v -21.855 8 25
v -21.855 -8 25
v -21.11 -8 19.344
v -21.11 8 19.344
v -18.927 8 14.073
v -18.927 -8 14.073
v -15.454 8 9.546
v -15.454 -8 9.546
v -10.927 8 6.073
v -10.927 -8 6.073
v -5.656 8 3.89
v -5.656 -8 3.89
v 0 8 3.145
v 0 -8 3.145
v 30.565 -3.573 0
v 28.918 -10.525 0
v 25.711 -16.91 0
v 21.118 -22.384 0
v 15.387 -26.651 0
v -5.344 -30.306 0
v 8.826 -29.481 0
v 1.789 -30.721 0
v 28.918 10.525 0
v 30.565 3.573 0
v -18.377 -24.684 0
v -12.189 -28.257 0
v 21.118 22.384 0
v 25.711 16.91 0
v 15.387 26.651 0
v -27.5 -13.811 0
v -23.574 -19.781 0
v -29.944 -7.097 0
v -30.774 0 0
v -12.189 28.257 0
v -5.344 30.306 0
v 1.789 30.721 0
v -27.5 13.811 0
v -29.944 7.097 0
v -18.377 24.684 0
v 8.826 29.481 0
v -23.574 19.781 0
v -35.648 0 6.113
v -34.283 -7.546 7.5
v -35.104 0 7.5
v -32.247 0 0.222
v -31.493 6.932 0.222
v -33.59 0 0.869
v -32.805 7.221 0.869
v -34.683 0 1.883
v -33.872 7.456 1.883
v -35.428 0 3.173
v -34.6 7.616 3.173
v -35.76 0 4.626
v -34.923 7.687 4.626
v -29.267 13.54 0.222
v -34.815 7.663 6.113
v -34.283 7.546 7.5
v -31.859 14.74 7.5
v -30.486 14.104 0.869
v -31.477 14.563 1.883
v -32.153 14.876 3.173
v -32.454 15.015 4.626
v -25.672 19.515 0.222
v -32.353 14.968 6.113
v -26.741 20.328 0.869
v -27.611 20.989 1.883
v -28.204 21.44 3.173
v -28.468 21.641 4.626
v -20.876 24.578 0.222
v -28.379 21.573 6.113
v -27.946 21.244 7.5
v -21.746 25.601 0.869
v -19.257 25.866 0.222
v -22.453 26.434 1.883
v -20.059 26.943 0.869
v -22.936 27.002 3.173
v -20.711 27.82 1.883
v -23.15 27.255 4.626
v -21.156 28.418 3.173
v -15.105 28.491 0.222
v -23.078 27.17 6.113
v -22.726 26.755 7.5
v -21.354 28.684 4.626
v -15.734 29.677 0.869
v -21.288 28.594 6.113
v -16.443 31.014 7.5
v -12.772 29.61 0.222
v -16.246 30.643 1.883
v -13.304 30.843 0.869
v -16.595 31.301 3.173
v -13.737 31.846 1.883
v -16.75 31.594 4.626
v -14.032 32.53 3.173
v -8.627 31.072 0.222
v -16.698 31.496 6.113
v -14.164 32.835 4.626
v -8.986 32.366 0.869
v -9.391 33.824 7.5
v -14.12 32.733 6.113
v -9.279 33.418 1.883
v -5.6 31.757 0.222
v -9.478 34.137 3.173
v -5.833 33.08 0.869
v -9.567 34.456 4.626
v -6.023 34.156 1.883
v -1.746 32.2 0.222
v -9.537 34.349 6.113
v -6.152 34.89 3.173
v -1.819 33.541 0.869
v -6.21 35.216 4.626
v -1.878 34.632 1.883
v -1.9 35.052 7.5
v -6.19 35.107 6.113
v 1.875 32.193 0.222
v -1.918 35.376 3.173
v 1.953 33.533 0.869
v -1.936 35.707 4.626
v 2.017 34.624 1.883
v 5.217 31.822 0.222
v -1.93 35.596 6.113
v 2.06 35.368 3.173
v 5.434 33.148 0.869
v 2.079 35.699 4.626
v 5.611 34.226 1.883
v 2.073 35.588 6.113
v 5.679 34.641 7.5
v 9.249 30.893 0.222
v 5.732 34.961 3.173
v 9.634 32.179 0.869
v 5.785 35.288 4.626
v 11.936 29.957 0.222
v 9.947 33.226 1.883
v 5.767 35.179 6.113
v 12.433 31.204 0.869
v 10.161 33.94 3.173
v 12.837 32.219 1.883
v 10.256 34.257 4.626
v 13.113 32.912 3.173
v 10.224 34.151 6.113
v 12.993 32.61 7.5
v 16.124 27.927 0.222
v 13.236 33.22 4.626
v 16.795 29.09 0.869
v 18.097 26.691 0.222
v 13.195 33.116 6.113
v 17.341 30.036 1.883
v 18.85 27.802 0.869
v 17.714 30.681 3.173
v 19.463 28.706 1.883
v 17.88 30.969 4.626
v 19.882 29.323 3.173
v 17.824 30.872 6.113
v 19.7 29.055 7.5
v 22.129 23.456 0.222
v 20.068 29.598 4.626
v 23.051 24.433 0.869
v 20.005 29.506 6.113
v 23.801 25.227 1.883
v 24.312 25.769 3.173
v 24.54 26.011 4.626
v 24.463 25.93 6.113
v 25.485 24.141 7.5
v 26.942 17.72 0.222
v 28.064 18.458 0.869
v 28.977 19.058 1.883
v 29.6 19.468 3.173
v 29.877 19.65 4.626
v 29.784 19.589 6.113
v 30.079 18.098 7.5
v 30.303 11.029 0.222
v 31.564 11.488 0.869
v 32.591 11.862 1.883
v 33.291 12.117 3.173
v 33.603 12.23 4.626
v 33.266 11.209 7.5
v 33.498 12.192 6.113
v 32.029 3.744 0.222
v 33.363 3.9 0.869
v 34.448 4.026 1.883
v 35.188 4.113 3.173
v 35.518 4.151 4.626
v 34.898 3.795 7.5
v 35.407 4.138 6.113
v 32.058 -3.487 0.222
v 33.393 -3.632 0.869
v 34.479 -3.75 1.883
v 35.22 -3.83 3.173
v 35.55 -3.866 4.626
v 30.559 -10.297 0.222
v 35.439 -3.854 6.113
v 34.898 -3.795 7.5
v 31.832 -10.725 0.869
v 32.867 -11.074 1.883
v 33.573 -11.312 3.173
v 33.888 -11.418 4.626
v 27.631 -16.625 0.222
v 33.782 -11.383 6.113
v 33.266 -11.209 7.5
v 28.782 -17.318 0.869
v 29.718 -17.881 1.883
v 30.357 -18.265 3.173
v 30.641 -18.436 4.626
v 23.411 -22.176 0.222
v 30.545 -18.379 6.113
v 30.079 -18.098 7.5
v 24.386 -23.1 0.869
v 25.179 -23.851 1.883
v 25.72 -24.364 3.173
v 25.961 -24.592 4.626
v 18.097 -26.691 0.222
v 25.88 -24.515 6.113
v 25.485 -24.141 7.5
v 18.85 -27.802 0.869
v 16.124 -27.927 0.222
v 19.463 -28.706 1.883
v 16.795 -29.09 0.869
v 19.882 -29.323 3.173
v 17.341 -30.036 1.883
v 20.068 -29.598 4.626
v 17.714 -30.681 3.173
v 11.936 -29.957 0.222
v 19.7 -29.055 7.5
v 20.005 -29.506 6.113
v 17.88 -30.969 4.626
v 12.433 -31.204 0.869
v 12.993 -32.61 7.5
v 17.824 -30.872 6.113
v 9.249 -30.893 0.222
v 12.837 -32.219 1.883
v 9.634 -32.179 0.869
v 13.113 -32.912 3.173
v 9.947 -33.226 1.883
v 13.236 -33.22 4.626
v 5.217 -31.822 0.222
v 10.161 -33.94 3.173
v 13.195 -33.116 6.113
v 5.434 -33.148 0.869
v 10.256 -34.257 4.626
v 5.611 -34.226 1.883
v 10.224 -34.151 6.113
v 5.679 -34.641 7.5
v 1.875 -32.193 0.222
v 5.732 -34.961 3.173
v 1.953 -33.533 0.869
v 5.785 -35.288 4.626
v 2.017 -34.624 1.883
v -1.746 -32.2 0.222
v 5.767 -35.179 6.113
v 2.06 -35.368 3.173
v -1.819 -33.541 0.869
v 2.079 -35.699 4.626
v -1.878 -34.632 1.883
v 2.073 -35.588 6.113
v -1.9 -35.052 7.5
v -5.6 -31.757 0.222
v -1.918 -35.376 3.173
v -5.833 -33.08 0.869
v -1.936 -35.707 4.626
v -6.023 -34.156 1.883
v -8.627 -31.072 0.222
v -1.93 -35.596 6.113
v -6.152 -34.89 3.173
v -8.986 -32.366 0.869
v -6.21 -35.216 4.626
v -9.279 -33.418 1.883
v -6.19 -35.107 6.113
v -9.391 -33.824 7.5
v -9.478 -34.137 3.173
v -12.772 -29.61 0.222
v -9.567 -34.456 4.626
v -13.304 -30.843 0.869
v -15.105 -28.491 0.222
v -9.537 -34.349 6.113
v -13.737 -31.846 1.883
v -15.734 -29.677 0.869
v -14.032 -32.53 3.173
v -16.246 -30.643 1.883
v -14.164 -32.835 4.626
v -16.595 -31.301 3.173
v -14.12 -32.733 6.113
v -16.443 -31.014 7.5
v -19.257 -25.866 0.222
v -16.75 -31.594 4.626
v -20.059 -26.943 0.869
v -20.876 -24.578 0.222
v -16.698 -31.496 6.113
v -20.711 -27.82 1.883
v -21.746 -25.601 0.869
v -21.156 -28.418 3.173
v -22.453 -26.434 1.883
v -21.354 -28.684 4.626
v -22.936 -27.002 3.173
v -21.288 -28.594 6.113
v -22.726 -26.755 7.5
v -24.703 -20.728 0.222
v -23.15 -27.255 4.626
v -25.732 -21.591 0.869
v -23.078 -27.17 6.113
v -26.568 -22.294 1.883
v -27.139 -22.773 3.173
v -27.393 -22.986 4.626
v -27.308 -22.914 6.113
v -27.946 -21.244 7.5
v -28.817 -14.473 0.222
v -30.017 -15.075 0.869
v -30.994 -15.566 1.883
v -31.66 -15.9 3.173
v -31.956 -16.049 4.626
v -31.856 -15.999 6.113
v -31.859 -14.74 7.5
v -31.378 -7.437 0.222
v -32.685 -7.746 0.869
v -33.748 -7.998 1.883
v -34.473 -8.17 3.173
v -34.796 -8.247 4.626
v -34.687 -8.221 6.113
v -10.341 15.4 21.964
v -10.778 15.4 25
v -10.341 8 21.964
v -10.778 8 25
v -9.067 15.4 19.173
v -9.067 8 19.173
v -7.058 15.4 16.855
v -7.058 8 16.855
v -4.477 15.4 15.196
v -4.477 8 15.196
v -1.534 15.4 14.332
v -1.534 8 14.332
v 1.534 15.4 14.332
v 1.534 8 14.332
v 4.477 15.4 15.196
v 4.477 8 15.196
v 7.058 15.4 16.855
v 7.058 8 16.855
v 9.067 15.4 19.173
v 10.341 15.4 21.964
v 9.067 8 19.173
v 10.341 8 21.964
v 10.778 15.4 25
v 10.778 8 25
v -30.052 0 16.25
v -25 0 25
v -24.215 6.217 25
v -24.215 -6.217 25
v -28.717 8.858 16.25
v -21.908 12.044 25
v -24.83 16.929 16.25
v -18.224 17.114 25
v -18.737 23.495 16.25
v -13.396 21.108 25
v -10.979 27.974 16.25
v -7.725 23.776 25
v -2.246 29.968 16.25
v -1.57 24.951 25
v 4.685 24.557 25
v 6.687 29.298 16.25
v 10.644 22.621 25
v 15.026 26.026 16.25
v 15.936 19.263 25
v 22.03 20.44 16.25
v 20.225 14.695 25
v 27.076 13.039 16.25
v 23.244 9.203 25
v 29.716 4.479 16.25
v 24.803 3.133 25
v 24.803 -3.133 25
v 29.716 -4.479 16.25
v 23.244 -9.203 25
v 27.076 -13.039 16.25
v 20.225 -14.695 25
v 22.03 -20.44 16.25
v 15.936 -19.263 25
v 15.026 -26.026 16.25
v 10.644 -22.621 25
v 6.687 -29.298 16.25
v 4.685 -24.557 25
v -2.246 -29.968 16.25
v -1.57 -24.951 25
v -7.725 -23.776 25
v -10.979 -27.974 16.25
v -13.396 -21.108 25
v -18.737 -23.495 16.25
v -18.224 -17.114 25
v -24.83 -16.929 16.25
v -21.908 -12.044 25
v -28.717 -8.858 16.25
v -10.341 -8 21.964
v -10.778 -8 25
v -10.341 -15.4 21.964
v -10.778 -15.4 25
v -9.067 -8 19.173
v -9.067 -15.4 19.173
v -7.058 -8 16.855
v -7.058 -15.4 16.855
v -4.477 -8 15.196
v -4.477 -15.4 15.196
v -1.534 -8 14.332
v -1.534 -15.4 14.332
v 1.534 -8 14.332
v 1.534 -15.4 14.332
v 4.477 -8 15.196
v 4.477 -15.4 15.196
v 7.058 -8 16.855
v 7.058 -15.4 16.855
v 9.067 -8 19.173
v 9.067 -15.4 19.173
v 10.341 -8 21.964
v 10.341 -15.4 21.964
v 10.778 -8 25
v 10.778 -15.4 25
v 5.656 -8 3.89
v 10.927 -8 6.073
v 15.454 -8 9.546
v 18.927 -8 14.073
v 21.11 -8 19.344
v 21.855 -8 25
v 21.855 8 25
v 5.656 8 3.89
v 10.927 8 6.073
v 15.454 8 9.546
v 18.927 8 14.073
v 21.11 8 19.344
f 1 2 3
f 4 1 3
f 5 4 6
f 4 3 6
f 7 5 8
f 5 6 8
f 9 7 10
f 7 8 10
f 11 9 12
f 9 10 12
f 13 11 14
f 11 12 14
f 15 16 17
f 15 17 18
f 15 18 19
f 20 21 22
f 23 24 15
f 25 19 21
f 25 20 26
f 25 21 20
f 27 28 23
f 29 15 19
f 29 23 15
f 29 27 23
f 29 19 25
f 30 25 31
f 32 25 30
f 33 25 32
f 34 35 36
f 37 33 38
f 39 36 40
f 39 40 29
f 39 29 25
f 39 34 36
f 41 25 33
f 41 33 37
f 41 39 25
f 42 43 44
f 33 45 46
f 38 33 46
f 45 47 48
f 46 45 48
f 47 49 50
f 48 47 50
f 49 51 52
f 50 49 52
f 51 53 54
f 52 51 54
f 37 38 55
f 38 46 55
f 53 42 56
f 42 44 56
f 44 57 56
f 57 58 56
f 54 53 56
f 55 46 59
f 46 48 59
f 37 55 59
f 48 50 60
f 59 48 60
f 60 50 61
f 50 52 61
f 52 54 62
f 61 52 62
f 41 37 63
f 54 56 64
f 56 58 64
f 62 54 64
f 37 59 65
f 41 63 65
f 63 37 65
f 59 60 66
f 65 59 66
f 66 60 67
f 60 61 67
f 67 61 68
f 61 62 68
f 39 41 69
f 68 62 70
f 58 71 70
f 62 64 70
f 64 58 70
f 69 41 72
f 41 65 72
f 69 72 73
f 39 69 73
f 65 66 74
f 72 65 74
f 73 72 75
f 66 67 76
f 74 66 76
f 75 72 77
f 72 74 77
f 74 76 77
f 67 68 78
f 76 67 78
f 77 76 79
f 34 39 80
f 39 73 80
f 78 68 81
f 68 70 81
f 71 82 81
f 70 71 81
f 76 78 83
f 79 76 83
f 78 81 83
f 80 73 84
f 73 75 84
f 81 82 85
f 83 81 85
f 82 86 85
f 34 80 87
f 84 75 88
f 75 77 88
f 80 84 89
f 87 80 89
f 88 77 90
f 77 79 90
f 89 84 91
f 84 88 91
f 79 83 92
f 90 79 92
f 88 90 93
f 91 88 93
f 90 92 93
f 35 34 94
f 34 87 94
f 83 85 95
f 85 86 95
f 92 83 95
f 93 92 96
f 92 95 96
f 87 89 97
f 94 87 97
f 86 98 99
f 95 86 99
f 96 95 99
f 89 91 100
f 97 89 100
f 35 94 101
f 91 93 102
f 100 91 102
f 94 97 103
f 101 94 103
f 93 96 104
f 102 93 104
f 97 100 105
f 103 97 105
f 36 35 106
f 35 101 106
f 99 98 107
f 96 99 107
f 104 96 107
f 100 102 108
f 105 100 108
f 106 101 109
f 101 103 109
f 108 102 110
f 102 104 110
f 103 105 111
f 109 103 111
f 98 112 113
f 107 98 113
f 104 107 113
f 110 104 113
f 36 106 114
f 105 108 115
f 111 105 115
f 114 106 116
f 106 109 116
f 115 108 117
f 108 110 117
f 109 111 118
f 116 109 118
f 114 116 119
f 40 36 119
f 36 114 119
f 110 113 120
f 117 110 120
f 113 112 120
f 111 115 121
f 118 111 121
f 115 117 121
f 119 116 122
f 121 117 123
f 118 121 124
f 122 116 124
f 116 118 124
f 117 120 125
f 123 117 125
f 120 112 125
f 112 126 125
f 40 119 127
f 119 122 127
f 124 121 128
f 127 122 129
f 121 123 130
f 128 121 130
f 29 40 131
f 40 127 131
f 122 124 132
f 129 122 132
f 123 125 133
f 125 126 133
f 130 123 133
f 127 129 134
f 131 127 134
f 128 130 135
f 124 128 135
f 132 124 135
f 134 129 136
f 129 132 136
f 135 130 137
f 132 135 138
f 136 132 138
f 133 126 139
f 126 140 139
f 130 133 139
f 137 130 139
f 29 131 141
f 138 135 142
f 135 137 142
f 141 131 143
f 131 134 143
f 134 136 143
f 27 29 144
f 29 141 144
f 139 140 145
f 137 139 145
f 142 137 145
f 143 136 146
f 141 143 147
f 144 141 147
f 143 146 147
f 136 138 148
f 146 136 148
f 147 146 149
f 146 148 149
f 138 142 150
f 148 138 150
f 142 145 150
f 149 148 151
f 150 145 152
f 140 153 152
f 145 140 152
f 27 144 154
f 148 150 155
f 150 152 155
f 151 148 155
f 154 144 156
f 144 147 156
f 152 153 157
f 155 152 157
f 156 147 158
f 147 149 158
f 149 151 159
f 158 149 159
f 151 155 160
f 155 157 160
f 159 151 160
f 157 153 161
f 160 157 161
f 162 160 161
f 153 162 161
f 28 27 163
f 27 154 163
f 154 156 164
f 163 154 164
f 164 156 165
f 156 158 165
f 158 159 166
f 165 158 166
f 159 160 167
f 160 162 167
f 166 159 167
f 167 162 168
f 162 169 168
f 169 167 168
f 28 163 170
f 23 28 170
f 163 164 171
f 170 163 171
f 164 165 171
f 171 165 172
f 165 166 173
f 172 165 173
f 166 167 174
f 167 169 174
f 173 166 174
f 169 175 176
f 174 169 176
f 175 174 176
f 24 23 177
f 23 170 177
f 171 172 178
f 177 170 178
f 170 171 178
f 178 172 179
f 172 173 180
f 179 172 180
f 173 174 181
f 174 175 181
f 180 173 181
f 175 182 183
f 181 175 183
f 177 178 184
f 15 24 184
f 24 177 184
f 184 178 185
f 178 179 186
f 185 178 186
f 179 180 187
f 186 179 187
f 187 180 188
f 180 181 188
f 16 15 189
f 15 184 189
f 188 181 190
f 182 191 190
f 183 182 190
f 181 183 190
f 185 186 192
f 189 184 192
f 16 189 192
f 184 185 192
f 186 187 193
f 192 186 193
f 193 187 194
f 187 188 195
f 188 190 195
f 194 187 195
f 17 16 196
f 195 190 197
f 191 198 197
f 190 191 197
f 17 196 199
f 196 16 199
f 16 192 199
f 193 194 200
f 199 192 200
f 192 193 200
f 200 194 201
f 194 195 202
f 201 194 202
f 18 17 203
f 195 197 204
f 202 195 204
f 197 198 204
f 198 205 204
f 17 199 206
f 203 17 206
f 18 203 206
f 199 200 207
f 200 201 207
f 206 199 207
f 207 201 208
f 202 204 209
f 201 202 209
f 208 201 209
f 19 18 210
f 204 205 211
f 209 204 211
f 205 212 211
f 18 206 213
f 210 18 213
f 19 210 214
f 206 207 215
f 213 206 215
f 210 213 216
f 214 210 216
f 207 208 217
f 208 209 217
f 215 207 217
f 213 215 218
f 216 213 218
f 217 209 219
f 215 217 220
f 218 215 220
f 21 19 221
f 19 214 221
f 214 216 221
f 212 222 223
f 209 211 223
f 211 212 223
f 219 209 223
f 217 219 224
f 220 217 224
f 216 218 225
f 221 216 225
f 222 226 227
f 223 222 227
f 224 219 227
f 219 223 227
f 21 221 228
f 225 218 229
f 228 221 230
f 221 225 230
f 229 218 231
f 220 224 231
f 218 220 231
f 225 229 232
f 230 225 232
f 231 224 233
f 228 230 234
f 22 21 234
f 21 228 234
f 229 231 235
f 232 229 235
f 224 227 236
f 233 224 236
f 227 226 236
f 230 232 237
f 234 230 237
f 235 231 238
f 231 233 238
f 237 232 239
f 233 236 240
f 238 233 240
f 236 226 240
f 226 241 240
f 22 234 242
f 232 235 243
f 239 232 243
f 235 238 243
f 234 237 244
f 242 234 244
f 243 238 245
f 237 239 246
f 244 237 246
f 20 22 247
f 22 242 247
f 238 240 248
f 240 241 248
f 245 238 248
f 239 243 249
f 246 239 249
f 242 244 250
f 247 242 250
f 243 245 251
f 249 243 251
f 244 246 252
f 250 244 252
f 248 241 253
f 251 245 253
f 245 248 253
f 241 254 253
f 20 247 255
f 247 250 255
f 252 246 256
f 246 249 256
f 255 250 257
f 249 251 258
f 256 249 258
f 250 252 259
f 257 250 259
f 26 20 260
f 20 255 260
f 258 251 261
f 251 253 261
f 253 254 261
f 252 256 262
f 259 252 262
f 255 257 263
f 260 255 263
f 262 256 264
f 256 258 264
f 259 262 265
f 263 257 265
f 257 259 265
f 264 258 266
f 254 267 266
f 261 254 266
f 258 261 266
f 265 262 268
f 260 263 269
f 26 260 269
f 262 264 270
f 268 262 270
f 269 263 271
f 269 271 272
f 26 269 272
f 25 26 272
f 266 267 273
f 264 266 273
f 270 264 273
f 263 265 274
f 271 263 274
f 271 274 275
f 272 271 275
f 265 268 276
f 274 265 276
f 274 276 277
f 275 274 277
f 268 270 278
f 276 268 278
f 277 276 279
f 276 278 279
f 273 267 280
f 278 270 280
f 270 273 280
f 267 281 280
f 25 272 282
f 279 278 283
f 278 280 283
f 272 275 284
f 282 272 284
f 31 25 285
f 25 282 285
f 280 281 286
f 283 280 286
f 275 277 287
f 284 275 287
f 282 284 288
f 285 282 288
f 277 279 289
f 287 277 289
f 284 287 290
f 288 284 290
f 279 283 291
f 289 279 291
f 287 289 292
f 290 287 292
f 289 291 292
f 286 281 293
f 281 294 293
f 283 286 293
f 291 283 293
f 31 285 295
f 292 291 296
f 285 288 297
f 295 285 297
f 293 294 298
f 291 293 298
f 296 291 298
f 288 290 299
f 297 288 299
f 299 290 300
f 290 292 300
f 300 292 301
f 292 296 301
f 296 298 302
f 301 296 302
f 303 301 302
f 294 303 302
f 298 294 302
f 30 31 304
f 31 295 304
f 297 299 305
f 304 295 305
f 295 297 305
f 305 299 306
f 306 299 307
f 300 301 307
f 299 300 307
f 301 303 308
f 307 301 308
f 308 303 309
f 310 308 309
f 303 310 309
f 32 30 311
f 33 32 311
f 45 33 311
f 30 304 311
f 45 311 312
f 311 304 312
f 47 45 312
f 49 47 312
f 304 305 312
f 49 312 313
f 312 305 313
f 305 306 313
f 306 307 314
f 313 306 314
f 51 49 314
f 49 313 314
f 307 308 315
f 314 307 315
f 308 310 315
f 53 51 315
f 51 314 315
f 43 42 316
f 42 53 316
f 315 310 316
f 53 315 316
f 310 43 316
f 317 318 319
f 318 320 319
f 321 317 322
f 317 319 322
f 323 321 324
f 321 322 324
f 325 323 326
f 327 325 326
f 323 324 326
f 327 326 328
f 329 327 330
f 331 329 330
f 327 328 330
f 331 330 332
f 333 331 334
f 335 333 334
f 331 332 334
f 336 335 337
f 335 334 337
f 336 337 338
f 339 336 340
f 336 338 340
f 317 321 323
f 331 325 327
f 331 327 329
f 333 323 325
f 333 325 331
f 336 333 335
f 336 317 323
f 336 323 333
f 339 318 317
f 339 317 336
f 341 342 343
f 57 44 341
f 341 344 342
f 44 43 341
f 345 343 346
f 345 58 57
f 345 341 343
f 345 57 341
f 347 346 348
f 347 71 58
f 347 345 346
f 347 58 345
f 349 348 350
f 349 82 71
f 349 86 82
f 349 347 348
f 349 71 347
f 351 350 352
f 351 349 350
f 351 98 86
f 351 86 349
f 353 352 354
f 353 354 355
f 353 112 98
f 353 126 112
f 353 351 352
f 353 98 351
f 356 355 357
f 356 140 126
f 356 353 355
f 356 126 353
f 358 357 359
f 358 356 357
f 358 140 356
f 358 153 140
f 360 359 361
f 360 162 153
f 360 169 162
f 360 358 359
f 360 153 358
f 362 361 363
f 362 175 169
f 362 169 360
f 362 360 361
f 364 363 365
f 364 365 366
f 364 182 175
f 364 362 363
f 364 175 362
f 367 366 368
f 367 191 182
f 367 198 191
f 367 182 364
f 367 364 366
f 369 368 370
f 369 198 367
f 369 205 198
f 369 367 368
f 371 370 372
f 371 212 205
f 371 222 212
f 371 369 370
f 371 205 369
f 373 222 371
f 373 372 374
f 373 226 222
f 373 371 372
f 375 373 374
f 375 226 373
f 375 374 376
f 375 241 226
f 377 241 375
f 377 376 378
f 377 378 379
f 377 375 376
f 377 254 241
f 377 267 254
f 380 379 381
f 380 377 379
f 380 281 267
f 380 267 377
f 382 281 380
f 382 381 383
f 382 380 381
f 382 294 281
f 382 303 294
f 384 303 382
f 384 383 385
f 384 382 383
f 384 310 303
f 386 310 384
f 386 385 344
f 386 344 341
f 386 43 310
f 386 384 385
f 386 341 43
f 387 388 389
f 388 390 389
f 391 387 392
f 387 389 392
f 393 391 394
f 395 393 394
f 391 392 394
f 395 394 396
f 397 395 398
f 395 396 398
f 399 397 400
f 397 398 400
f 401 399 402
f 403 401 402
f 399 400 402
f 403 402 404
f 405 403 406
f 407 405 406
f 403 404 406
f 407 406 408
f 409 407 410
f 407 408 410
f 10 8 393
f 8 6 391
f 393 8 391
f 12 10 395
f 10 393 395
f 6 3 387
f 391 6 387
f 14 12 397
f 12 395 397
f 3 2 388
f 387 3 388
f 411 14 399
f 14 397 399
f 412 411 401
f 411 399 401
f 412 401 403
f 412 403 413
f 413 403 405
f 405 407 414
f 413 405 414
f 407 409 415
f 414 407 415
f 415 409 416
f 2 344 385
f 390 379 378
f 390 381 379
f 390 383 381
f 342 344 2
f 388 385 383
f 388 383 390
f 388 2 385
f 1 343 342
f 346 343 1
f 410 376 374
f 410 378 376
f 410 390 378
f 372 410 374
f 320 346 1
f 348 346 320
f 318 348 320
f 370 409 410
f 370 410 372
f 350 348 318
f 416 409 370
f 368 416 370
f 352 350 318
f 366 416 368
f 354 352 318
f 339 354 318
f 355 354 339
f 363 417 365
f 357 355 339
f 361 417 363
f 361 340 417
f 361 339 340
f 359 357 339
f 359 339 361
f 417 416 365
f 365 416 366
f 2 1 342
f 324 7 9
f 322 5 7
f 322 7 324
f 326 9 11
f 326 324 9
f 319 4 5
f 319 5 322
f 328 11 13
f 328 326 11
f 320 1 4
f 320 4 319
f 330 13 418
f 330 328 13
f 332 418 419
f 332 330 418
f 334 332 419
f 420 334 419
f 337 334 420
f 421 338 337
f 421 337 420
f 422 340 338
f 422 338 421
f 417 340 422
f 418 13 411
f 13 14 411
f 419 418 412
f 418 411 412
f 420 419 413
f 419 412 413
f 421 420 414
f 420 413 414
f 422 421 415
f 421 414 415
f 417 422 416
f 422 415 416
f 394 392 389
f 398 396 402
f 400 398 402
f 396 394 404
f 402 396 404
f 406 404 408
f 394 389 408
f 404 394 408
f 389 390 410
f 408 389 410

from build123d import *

# Parameters (mm, degrees)
F4_DEPTH = 8
F5_R     = 5
F6_R     = 10.7775
F7_DEPTH = 15.4


with BuildPart() as f2:
    # F1 (on Front) → F2 (revolve)
    with BuildSketch(Plane.XZ):
        Polygon((-39.4337567297, 0), (0, 0), (0, 25), (-25, 25), align=None)
    revolve(axis=Axis((0, 0, 12.5), (0, 0, -1)))

    # F3 (on Front) → F4 (cut, symmetric)
    with BuildSketch(Plane.XZ):
        with BuildLine():
            Line((21.855, 25), (0, 25))
            Line((0, 25), (0, 3.145))
            ThreePointArc((0, 3.145), (15.4538187028, 9.5461812972), (21.855, 25))
        make_face()
        with BuildLine():
            Line((0, 3.145), (0, 25))
            Line((0, 25), (-21.855, 25))
            ThreePointArc((-21.855, 25), (-15.4538187028, 9.5461812972), (0, 3.145))
        make_face()
    extrude(amount=F4_DEPTH, both=True, mode=Mode.SUBTRACT)

    # F5
    f5_edges = [f2.edges().sort_by_distance(p)[0] for p in [
        (39.433757, 0, 0),
    ]]
    fillet(f5_edges, radius=F5_R)

    # F6 (on Front) → F7 (cut, symmetric)
    with BuildSketch(Plane.XZ):
        with Locations((0, 25)):
            Circle(F6_R)
    extrude(amount=F7_DEPTH, both=True, mode=Mode.SUBTRACT)


solid = f2.part
